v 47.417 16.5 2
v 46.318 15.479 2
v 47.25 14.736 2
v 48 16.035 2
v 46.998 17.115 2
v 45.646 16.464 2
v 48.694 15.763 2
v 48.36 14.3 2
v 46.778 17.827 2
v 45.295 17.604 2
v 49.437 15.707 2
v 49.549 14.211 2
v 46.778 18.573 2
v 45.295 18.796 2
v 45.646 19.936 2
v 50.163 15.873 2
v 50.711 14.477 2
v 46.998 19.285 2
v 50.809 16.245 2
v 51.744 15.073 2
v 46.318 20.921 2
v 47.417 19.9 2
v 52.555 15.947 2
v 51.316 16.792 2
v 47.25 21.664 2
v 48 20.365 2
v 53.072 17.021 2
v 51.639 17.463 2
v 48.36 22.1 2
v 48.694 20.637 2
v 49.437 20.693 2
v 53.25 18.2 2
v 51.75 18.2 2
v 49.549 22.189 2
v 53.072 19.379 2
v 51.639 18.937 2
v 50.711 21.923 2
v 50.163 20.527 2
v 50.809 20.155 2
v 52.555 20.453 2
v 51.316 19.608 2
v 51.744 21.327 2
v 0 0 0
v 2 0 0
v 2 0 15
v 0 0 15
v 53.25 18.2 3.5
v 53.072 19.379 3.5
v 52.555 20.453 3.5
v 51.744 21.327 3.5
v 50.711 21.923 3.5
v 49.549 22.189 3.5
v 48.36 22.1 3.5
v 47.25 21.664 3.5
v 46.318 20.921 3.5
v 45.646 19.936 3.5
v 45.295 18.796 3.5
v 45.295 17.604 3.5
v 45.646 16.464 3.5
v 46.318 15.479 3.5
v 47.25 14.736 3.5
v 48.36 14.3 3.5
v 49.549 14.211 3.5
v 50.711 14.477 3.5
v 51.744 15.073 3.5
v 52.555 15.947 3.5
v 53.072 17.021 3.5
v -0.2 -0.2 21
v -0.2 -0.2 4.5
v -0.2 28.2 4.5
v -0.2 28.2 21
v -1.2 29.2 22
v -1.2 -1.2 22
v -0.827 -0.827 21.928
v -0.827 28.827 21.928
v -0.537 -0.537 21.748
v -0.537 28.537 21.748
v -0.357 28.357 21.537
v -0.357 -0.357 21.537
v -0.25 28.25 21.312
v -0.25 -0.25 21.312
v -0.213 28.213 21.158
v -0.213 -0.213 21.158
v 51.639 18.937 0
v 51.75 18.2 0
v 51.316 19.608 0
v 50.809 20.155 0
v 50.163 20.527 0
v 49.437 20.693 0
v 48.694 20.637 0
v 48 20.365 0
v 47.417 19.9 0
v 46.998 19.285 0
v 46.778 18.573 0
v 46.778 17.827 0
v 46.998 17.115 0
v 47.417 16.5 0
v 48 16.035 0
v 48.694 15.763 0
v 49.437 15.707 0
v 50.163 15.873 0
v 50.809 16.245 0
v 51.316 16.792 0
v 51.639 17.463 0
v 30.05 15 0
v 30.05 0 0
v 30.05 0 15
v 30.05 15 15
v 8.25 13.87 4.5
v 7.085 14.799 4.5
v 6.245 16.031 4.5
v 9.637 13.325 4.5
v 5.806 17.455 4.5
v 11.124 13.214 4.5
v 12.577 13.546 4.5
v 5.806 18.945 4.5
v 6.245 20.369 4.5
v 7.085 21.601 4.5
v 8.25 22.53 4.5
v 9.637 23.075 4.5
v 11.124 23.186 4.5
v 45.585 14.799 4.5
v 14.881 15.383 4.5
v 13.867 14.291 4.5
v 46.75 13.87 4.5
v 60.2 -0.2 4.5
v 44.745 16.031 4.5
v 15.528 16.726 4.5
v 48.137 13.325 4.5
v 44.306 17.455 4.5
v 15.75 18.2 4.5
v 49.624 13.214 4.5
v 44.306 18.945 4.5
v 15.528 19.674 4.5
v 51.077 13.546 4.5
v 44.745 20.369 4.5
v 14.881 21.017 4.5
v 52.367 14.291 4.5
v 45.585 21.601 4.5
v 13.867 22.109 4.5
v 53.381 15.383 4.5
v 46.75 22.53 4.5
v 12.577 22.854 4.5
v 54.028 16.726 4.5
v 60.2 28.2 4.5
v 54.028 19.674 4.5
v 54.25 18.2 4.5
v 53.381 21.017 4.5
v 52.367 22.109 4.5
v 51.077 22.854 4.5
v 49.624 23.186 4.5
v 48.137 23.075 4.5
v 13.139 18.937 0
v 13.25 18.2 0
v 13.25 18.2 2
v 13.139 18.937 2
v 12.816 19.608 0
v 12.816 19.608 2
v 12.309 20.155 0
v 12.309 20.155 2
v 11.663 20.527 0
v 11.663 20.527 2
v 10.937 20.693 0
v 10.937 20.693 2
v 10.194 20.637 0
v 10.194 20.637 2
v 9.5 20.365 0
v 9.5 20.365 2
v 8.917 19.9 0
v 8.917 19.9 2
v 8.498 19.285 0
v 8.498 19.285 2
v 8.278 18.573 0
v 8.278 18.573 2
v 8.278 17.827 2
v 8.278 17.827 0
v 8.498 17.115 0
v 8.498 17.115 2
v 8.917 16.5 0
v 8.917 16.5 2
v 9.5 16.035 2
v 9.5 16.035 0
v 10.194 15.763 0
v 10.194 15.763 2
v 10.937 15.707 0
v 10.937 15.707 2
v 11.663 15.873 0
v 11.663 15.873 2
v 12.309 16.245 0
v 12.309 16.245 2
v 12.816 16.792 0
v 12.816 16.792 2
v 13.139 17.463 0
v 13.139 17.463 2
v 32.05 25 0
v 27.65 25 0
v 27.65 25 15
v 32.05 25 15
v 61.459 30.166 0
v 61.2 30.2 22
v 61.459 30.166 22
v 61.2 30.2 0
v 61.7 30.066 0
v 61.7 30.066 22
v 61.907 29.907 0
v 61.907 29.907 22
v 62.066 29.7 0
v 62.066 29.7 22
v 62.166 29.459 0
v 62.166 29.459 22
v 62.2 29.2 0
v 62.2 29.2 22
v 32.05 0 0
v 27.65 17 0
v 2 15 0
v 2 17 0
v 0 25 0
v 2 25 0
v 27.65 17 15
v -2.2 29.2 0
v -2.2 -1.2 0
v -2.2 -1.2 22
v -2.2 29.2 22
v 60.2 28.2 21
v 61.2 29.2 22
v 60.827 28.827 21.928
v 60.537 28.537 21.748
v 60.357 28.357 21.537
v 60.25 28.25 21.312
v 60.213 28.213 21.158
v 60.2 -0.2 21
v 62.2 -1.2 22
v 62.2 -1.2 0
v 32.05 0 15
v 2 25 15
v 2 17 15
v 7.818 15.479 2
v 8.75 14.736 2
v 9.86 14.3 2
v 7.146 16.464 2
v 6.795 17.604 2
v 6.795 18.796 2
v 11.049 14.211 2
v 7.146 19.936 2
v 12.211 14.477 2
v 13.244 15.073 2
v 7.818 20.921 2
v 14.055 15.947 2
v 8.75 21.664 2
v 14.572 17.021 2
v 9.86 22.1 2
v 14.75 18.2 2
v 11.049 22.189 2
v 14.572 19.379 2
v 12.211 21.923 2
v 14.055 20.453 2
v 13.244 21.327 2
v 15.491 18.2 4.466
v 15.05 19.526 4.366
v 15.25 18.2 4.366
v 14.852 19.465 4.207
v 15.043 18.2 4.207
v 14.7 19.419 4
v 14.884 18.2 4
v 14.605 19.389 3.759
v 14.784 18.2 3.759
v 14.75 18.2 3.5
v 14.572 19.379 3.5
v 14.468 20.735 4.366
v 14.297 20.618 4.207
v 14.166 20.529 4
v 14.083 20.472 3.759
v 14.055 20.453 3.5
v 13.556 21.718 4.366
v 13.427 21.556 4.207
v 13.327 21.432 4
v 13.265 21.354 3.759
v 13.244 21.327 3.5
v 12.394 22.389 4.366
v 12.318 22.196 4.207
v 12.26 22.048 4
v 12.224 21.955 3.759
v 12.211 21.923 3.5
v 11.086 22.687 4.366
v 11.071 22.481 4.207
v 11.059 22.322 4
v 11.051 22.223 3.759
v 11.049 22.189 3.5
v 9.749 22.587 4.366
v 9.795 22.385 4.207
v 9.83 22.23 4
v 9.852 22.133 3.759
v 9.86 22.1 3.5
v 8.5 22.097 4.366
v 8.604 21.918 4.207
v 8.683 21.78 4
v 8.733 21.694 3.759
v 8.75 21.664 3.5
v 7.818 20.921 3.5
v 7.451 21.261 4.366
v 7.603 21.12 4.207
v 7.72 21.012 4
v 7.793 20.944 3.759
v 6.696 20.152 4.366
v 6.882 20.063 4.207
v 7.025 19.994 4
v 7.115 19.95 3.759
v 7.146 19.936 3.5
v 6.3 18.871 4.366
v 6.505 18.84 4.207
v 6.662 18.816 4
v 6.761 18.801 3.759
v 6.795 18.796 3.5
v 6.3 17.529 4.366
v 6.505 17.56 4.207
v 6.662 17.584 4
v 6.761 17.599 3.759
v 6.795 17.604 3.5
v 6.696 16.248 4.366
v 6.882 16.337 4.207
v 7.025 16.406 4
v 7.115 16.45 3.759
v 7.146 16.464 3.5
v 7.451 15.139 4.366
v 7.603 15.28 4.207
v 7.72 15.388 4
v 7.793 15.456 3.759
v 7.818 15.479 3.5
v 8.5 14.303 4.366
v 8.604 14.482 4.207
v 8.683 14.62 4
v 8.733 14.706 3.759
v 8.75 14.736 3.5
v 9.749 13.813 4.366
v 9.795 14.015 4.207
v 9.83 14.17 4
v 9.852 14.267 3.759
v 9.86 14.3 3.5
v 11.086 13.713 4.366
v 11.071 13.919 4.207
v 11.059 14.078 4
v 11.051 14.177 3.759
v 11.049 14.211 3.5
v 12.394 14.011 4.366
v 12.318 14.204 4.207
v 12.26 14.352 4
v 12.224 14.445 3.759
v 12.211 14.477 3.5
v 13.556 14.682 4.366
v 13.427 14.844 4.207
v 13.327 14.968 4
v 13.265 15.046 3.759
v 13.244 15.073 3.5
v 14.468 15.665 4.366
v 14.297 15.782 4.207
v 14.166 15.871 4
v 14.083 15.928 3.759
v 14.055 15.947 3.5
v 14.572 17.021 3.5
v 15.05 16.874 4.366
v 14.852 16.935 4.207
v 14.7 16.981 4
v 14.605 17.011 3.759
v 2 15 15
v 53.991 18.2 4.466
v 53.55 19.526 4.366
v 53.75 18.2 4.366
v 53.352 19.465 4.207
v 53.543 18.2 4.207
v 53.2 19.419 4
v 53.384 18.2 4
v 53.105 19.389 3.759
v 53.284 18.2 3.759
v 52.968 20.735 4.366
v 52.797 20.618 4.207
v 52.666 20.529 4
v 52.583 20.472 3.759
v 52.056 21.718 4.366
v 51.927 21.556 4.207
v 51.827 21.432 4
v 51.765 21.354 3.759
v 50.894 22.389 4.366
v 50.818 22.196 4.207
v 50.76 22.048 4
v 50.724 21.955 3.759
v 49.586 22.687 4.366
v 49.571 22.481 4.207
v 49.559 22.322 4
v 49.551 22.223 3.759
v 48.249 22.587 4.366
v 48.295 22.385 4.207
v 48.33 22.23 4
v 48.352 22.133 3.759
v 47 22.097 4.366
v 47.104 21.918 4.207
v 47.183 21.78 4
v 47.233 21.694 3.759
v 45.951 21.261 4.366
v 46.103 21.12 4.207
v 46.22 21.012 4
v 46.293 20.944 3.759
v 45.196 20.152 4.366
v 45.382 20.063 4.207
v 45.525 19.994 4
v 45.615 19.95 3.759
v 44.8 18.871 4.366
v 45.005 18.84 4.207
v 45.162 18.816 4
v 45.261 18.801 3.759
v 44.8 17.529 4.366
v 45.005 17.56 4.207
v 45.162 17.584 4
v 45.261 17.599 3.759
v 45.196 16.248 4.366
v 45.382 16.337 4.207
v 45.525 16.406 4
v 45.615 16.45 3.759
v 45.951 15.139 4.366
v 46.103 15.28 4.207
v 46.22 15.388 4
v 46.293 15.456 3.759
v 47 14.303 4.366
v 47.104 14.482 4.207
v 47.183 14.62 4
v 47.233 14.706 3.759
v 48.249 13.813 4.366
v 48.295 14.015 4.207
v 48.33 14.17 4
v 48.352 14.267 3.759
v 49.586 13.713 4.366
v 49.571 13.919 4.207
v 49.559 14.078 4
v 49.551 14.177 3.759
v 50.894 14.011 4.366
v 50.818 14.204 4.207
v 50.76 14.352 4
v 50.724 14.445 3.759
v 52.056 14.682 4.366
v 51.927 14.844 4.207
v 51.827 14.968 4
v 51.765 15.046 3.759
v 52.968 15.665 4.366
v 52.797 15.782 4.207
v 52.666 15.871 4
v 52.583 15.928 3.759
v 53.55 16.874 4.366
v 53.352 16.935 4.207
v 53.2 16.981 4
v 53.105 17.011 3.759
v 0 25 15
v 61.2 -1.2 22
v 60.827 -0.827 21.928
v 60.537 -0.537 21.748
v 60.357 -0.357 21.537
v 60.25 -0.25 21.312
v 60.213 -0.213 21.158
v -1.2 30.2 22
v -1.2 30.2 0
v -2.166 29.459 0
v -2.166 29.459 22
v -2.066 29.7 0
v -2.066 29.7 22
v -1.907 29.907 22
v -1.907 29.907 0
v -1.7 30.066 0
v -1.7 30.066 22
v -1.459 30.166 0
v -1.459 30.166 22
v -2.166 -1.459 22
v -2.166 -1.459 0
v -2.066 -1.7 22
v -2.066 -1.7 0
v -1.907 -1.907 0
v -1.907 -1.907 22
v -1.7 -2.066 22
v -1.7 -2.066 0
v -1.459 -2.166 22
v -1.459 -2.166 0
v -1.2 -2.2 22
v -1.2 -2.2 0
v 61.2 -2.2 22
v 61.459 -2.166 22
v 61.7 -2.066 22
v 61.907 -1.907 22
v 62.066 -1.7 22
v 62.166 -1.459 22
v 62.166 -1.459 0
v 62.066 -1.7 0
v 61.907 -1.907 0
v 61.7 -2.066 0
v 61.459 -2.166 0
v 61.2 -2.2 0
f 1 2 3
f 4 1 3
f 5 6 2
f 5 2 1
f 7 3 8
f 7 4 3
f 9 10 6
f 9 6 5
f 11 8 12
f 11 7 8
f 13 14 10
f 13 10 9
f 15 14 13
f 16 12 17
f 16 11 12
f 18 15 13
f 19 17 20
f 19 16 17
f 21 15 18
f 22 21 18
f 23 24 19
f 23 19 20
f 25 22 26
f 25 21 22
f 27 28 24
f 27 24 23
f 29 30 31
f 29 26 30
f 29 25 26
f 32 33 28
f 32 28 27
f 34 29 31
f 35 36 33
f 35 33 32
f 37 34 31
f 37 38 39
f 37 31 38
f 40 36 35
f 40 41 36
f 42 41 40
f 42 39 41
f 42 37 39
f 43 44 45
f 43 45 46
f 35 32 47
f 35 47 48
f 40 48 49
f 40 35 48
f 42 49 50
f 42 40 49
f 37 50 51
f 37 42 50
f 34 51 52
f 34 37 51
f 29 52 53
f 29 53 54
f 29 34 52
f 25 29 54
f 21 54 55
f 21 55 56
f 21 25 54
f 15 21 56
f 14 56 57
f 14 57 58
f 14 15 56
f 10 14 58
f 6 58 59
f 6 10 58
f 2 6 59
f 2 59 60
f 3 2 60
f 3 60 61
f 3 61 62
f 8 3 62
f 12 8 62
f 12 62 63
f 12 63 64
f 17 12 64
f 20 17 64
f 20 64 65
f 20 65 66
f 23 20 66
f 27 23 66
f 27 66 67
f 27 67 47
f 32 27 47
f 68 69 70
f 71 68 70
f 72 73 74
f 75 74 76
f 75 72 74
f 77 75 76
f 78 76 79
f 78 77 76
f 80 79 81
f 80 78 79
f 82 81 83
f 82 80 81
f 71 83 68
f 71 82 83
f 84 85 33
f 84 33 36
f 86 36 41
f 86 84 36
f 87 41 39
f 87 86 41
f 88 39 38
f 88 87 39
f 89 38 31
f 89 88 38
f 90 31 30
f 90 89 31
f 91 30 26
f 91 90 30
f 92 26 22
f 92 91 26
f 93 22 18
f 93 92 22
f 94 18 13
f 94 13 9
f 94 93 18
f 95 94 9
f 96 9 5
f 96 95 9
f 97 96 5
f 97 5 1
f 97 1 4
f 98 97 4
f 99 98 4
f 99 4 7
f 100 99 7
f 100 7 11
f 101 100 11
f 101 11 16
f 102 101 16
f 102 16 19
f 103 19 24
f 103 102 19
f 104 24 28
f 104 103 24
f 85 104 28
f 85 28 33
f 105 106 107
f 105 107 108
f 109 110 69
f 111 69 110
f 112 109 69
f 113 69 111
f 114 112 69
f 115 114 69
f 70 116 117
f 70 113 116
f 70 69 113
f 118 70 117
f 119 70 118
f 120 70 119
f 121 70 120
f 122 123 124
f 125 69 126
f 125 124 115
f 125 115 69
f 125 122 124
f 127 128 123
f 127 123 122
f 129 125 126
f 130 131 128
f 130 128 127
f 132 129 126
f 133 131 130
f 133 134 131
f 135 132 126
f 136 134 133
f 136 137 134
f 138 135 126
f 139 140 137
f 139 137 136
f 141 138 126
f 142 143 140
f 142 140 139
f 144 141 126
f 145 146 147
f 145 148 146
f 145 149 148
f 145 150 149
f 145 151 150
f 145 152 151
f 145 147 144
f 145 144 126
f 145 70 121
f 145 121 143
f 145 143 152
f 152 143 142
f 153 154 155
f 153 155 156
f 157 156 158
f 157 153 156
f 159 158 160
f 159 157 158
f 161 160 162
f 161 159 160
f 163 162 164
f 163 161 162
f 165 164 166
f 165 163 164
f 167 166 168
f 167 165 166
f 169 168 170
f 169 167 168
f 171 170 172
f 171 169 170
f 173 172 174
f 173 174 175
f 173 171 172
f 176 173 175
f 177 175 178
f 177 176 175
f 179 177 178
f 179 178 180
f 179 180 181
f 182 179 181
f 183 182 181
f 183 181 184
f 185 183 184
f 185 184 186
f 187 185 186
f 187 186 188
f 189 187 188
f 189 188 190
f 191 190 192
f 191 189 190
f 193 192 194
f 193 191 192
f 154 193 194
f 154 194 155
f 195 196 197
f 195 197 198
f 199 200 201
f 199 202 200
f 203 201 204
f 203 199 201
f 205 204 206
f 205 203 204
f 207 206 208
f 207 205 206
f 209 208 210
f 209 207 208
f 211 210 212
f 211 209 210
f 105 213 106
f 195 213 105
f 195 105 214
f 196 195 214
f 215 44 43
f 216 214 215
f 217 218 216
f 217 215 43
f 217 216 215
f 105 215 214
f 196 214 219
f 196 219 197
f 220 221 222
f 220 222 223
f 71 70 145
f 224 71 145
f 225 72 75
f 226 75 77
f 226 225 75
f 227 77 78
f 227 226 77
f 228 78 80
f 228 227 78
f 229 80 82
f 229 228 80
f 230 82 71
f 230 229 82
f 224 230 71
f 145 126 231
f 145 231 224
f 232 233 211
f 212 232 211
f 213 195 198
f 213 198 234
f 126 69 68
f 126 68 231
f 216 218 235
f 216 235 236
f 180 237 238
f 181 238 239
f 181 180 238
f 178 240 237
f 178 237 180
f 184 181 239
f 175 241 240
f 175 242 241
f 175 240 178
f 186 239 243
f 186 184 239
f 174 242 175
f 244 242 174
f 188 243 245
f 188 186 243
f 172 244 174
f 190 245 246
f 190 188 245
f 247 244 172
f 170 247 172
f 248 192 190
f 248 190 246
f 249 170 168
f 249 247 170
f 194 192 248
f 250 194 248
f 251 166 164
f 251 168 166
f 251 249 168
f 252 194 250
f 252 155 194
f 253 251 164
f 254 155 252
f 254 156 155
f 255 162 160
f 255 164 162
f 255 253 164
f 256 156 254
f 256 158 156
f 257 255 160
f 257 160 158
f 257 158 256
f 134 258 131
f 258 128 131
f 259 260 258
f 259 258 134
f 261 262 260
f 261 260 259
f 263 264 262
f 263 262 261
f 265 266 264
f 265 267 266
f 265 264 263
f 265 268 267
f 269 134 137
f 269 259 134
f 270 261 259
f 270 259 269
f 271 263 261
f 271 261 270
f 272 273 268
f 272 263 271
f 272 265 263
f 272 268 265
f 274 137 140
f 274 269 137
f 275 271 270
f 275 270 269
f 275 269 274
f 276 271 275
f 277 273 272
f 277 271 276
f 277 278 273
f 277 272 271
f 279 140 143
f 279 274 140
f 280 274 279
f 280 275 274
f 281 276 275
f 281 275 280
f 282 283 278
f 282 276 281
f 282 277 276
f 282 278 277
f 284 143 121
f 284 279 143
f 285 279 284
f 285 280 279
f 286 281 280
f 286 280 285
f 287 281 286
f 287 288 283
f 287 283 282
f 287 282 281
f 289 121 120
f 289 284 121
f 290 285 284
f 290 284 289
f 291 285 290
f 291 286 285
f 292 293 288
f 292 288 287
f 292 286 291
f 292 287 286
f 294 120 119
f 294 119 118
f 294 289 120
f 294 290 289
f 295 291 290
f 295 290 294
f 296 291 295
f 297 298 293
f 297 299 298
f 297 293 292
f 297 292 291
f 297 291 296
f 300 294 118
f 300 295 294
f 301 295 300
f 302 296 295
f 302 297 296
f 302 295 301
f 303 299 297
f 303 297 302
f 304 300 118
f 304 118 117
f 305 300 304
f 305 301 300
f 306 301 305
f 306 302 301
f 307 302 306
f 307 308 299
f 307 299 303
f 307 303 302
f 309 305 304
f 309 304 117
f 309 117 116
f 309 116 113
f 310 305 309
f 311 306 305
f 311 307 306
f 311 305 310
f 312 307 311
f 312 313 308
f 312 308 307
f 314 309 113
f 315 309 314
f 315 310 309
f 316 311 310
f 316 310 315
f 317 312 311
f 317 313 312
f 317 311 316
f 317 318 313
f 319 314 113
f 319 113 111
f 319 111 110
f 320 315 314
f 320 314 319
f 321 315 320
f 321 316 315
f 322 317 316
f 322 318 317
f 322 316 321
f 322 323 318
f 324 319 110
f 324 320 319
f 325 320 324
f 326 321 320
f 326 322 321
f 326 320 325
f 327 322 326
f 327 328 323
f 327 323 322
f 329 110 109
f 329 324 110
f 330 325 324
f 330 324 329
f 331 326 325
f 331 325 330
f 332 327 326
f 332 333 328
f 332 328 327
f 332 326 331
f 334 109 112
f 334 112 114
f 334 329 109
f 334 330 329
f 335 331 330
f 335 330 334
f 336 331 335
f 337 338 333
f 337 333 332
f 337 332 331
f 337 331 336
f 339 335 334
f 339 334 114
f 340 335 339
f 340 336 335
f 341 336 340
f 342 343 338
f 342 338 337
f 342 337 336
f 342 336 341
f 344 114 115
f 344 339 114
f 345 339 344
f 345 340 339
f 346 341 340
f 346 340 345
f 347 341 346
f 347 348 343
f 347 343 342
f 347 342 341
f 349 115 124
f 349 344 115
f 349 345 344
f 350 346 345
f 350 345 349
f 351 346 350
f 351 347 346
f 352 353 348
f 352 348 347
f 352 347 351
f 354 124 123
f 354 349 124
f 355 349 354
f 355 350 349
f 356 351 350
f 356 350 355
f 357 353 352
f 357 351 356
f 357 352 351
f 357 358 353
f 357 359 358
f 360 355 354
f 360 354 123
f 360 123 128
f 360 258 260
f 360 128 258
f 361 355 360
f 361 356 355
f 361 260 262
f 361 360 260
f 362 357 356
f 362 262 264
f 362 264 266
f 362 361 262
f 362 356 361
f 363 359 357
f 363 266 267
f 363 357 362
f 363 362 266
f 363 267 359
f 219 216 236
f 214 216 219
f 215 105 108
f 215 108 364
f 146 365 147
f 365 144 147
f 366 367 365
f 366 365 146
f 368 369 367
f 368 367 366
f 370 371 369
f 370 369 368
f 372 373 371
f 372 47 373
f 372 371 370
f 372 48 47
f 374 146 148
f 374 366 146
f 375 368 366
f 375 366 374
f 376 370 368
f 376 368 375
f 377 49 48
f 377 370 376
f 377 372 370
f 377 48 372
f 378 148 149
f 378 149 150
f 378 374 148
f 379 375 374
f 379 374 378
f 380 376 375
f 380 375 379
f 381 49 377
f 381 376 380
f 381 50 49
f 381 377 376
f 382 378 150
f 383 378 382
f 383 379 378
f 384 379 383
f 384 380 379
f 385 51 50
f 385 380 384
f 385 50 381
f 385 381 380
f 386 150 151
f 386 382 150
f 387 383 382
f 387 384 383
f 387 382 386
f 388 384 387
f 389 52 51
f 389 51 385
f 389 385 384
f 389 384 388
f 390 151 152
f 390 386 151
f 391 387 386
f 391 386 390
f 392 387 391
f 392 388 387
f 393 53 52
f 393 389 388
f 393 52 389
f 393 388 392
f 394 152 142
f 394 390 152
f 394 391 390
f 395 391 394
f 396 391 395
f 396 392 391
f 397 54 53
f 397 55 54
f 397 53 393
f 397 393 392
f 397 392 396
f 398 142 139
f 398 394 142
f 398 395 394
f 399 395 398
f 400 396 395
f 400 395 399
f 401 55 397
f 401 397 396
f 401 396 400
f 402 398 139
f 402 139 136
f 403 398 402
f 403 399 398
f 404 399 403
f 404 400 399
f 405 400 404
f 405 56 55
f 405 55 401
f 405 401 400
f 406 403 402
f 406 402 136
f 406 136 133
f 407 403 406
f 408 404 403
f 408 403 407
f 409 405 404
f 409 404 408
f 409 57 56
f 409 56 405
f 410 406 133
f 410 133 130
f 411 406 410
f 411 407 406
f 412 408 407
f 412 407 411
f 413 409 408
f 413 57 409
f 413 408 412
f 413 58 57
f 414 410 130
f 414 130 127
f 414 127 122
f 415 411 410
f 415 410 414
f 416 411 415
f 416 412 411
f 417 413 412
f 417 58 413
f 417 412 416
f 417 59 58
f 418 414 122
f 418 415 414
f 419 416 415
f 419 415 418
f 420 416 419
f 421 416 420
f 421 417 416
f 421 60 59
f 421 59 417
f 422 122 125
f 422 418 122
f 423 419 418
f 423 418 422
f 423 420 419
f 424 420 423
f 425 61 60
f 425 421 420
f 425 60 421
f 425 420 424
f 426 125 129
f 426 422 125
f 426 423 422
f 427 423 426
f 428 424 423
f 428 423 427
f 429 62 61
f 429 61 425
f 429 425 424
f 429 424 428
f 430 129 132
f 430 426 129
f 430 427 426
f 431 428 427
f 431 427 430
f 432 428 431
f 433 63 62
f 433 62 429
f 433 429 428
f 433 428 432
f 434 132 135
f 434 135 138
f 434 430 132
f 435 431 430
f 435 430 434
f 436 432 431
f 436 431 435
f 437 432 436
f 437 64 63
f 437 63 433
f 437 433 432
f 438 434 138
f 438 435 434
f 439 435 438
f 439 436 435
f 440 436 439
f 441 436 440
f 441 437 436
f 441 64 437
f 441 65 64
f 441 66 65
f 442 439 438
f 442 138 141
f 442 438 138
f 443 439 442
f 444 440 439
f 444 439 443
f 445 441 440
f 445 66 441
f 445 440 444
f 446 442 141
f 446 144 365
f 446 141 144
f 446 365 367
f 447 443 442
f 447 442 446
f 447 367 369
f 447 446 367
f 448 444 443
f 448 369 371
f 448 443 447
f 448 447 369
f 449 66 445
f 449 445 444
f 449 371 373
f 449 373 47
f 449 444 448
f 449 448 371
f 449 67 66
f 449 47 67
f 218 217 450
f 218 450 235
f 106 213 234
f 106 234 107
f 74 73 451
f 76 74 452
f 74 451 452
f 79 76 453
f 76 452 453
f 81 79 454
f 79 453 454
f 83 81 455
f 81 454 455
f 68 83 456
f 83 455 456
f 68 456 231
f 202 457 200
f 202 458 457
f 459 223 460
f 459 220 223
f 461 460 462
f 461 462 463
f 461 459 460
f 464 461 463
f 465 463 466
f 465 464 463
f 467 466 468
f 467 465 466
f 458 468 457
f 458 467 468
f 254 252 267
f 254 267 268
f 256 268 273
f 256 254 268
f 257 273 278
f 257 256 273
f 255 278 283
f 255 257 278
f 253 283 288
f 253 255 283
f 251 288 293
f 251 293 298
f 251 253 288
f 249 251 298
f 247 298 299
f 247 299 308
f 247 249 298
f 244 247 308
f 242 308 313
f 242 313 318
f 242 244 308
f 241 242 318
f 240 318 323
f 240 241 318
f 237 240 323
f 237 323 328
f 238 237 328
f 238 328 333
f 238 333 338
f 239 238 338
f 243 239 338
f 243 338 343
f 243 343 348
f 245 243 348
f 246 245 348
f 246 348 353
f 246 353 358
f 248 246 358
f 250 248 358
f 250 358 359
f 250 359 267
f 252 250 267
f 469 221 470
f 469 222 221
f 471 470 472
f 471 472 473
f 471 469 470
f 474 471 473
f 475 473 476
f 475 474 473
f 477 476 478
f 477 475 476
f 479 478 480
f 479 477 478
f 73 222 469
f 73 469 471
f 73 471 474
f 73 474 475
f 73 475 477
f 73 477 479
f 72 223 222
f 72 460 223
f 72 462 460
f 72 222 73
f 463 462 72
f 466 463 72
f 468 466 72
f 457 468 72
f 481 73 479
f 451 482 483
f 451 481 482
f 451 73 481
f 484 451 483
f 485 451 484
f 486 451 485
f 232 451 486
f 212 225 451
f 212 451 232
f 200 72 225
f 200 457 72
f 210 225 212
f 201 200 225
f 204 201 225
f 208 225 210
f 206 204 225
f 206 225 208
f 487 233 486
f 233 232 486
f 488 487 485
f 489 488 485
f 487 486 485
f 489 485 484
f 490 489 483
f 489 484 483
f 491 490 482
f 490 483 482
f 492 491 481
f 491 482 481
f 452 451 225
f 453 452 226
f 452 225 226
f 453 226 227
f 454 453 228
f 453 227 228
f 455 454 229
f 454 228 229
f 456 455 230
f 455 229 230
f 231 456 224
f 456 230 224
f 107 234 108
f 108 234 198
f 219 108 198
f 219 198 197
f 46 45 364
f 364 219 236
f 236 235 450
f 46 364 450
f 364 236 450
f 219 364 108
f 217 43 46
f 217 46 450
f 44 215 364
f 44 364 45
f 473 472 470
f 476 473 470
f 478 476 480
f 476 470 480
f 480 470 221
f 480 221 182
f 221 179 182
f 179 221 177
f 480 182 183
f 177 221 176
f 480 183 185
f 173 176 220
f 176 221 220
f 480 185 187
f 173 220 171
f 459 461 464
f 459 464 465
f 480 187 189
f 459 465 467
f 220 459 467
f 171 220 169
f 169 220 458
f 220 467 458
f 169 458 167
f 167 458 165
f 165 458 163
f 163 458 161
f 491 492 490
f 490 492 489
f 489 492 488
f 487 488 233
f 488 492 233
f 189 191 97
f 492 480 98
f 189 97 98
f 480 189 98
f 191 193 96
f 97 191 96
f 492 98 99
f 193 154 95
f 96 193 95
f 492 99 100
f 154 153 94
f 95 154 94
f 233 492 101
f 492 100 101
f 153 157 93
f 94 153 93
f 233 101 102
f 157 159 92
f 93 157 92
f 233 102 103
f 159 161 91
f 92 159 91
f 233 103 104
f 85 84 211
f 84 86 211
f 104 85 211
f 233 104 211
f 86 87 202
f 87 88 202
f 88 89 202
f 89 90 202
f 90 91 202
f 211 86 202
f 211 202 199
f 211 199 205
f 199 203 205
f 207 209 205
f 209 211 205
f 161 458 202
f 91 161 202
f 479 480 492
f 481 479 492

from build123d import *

# Parameters (mm, degrees)
SKETCH001_W   = 64.4
SKETCH001_H   = 32.4
SKETCH001_R   = 2.5
PAD_DEPTH     = 2
SKETCH002_W   = 64.4
SKETCH002_H   = 32.4
SKETCH002_W_2 = 60.4
SKETCH002_H_2 = 28.4
PAD001_DEPTH  = 22
SKETCH003_W   = 64.4
SKETCH003_H   = 32.4
SKETCH003_R   = 4
PAD002_DEPTH  = 4.5
FILLET_R      = 1
PAD003_DEPTH  = 15


with BuildPart() as body:
    # Sketch001 → Pad (new body)
    with BuildSketch(Plane.XY):
        with Locations((30, 14)):
            Rectangle(SKETCH001_W, SKETCH001_H)
        with Locations((49.25, 18.2)):
            Circle(SKETCH001_R, mode=Mode.SUBTRACT)
        with Locations((10.75, 18.2)):
            Circle(SKETCH001_R, mode=Mode.SUBTRACT)
    extrude(amount=PAD_DEPTH)

    # Sketch002 → Pad001 (join)
    with BuildSketch(Plane.XY):
        with Locations((30, 14)):
            Rectangle(SKETCH002_W, SKETCH002_H)
        with Locations((30, 14)):
            Rectangle(SKETCH002_W_2, SKETCH002_H_2, mode=Mode.SUBTRACT)
    extrude(amount=PAD001_DEPTH)

    # Sketch003 → Pad002 (join)
    with BuildSketch(Plane.XY):
        with Locations((30, 14)):
            Rectangle(SKETCH003_W, SKETCH003_H)
        with Locations((49.25, 18.2)):
            Circle(SKETCH003_R, mode=Mode.SUBTRACT)
        with Locations((10.75, 18.2)):
            Circle(SKETCH003_R, mode=Mode.SUBTRACT)
    extrude(amount=PAD002_DEPTH)

    # Fillet
    fillet_edges = [body.edges().sort_by_distance(p)[0] for p in [
        (-0.2, 14, 22),
        (30, -0.2, 22),
        (60.2, 14, 22),
        (30, 28.2, 22),
        (62.2, 30.2, 13.25),
        (62.2, -2.2, 13.25),
        (-2.2, -2.2, 13.25),
        (-2.2, 30.2, 13.25),
        (6.75, 18.2, 4.5),
        (45.25, 18.2, 4.5),
    ]]
    fillet(fillet_edges, radius=FILLET_R)


with BuildPart() as body001picoadapter:
    # Sketch004 → Pad003 (new body)
    with BuildSketch(Plane.XY):
        Polygon((0, 0), (0, 25), (2, 25), (2, 17), (27.65, 17), (27.65, 25), (32.05, 25), (32.05, 0), (30.05, 0), (30.05, 15), (2, 15), (2, 0), align=None)
    extrude(amount=PAD003_DEPTH)


solid = Compound([body.part, body001picoadapter.part])
